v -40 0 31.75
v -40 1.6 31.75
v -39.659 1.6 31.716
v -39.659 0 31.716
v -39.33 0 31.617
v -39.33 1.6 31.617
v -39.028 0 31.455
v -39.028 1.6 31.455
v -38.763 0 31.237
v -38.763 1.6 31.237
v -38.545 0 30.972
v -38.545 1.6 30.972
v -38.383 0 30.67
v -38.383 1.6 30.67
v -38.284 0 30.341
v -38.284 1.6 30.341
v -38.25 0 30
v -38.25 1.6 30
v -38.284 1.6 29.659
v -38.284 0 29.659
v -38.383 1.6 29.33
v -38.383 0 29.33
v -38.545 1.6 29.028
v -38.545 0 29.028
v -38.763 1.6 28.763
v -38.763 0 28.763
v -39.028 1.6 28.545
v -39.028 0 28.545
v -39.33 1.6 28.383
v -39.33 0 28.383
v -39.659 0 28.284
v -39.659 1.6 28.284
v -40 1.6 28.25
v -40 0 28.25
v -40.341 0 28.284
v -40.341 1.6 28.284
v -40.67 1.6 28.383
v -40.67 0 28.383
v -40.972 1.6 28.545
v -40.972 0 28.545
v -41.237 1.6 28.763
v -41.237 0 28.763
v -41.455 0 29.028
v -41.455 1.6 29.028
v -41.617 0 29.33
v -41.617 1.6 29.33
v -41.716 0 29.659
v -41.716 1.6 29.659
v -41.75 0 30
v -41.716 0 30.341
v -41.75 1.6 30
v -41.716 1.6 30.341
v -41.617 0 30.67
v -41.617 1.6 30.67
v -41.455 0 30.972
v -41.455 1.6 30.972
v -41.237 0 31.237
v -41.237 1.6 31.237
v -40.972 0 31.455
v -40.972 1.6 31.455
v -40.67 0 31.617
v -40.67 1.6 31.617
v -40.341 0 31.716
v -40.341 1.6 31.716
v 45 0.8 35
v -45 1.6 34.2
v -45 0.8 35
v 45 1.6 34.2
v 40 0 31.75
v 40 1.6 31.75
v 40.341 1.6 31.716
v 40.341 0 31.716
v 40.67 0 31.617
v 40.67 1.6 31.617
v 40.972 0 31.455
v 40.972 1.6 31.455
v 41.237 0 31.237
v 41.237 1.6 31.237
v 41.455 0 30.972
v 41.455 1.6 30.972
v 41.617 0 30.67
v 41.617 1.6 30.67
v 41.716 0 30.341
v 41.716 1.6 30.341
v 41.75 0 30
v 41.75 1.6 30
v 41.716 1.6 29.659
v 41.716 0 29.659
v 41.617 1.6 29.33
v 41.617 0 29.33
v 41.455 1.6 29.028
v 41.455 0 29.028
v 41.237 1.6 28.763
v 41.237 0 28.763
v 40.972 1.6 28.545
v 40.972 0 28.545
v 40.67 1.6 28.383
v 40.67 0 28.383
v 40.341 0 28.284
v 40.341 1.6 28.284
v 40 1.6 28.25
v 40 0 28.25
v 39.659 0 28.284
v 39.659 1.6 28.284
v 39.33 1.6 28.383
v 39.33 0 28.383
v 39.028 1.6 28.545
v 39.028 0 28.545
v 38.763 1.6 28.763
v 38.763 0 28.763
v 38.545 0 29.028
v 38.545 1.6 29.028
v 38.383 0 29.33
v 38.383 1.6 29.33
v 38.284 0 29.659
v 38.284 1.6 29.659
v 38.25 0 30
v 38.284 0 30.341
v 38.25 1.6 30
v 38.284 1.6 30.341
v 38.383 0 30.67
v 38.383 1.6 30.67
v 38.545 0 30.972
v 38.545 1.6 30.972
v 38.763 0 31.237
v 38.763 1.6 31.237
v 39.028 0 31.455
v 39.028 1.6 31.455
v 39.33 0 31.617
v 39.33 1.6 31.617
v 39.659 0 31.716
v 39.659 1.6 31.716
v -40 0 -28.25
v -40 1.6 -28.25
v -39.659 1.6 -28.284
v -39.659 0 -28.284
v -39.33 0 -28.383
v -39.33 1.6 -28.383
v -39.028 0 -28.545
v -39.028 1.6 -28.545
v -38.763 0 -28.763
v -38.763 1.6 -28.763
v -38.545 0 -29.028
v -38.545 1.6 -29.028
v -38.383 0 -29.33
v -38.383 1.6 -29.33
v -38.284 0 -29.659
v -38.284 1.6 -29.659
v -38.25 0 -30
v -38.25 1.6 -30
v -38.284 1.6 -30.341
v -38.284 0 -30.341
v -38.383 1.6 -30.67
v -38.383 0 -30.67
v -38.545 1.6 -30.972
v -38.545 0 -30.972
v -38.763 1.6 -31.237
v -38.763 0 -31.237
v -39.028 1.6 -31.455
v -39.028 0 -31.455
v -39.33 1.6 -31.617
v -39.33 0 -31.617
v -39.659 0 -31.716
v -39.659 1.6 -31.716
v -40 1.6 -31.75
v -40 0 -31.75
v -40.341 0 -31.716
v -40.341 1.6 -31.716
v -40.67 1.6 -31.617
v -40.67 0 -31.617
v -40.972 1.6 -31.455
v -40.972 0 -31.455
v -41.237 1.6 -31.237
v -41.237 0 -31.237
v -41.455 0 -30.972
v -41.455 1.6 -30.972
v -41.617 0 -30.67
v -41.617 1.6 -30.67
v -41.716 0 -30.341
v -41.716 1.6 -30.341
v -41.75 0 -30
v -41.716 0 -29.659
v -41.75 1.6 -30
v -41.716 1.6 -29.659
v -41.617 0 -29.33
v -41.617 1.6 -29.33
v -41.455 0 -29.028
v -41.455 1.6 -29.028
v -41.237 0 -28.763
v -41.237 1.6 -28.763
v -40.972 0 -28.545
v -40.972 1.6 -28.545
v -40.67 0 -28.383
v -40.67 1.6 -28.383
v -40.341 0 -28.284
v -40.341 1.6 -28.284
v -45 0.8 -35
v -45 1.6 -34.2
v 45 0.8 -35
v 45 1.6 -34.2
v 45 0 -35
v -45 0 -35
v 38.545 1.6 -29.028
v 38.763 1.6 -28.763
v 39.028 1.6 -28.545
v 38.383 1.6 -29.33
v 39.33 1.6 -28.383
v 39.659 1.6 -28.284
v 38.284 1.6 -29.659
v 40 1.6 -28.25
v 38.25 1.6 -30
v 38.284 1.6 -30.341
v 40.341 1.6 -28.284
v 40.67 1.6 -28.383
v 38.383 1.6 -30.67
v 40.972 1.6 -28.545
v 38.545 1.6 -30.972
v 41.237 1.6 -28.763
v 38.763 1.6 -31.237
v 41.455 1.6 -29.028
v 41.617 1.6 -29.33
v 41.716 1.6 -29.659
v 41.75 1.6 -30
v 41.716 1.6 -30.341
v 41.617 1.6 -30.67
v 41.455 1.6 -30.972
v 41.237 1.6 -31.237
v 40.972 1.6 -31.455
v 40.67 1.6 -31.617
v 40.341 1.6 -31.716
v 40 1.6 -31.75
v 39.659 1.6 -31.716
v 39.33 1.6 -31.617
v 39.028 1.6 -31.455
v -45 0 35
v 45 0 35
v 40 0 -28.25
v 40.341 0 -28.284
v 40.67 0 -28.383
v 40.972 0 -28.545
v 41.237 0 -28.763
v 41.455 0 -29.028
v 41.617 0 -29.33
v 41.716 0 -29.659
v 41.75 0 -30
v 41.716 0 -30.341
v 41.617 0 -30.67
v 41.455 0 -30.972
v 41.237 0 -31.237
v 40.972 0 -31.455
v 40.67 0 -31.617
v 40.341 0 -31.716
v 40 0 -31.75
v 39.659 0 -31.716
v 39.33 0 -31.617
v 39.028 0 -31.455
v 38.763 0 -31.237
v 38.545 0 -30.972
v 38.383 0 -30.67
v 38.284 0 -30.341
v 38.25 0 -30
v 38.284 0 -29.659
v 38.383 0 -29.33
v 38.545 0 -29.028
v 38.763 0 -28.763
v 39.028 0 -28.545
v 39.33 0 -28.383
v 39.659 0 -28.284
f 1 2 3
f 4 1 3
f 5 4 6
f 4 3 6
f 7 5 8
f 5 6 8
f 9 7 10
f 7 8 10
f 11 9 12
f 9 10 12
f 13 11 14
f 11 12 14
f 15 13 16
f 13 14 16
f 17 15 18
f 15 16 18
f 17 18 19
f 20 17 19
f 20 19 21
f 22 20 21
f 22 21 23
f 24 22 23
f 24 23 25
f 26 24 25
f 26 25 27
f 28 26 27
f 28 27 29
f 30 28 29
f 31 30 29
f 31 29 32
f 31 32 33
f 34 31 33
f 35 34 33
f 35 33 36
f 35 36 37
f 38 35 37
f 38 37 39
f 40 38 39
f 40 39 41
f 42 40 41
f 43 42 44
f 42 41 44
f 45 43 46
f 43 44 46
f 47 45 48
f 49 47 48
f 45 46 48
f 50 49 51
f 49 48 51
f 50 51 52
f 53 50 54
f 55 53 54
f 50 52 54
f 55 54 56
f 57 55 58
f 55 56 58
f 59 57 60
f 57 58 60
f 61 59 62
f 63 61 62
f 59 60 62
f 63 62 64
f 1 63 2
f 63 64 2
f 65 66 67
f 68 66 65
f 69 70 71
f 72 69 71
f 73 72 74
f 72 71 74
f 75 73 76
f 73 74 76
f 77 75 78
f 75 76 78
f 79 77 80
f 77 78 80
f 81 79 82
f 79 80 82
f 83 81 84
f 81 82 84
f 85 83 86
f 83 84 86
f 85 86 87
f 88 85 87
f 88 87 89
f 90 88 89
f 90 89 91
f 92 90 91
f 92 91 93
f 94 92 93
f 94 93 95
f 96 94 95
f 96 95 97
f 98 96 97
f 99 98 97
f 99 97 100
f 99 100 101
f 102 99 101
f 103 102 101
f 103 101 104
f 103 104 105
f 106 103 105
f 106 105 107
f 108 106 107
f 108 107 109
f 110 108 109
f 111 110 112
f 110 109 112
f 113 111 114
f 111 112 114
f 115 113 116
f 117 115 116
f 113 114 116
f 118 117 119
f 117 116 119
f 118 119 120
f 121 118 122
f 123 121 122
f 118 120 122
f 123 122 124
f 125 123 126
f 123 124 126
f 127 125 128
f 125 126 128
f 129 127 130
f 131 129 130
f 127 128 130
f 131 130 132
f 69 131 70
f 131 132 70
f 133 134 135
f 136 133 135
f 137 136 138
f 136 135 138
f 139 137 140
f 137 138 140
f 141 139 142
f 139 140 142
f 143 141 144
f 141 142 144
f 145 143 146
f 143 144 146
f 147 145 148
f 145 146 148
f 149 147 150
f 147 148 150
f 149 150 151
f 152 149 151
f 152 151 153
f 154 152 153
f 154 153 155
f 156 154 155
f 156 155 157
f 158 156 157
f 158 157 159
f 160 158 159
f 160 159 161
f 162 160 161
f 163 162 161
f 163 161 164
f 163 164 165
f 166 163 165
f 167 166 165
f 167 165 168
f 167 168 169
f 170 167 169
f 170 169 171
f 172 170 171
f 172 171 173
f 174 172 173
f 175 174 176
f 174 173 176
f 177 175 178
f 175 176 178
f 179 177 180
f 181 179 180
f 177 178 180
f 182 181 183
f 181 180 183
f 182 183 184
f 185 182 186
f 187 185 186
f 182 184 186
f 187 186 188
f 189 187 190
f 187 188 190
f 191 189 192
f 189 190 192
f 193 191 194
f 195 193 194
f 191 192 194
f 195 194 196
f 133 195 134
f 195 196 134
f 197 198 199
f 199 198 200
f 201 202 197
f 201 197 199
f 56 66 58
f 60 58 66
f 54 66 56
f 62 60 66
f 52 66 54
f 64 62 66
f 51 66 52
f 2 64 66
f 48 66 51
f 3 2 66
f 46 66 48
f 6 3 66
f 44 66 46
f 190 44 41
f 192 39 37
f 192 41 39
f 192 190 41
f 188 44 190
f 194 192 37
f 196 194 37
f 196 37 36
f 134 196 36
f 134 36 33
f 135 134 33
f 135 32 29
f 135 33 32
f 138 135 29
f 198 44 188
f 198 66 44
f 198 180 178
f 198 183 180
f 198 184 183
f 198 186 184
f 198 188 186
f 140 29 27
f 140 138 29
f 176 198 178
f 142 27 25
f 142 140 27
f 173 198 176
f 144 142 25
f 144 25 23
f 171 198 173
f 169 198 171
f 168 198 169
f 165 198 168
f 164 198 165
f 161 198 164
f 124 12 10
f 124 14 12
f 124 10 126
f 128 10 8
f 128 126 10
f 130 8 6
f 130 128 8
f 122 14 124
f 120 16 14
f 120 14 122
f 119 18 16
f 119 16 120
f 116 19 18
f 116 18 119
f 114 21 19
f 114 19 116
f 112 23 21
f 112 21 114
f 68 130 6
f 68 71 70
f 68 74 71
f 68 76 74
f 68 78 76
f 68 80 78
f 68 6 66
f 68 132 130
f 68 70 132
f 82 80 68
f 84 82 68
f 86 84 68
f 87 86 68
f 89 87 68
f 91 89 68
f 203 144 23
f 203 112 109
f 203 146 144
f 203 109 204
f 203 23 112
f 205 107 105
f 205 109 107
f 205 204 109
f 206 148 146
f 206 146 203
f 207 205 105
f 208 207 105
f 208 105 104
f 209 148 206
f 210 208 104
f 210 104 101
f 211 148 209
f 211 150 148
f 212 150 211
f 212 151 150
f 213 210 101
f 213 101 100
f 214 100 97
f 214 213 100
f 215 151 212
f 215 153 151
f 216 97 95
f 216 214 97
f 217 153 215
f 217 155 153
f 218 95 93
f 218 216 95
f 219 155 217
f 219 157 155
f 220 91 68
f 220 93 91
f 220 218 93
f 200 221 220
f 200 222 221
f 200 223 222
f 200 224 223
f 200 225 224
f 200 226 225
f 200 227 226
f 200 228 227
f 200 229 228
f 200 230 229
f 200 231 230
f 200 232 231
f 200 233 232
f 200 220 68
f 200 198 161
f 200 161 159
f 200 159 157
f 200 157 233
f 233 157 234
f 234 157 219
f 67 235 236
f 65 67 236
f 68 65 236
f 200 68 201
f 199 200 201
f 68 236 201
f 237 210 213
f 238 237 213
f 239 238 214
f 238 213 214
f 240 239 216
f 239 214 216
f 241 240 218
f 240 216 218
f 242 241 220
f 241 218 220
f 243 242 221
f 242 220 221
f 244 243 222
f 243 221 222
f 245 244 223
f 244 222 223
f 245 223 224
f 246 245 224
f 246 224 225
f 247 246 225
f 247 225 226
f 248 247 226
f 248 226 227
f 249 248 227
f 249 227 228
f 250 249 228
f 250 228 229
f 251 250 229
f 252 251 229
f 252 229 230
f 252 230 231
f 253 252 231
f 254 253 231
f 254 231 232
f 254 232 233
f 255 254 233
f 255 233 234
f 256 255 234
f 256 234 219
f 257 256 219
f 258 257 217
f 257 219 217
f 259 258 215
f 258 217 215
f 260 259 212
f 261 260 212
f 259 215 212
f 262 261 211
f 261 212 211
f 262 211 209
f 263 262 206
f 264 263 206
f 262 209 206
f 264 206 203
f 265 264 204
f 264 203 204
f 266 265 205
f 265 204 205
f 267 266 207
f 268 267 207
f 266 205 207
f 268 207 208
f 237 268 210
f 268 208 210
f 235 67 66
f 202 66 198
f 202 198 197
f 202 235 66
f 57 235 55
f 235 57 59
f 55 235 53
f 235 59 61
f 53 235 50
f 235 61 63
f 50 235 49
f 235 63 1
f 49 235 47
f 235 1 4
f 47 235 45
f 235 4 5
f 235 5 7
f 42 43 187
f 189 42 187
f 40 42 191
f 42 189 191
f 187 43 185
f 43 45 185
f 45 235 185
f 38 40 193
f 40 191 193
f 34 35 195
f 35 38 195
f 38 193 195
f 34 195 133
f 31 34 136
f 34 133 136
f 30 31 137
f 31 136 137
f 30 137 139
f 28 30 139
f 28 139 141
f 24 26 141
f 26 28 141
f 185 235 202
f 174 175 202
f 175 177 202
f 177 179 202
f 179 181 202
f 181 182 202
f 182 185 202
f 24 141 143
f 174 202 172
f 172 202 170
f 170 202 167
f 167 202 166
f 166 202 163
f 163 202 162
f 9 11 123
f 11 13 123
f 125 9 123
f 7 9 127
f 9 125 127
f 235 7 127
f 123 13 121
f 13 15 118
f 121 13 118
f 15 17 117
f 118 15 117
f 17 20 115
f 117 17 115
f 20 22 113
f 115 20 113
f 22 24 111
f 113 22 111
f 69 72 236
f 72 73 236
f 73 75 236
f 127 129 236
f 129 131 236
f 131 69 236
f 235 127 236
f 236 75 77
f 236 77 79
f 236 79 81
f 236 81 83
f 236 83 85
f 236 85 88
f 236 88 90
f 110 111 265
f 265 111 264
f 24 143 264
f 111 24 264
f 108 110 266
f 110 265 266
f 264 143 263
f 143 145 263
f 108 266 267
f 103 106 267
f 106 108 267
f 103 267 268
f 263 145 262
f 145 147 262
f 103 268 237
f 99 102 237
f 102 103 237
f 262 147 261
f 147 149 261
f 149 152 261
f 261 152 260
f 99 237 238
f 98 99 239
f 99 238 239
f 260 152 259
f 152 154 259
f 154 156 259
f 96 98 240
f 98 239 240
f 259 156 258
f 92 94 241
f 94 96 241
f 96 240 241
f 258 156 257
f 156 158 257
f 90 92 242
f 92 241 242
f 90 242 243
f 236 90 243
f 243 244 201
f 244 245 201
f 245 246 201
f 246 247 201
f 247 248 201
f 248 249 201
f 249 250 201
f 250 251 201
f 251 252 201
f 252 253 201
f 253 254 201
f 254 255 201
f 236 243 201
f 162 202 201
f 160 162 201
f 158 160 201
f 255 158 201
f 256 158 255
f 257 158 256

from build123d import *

# Parameters (mm, degrees)
SKETCH1_W           = 90
SKETCH1_H           = 70
BOSS_EXTRUDE1_DEPTH = 1.6
SKETCH2_R           = 1.75
CUT_EXTRUDE1_DEPTH  = 58.031219521
CHAMFER1_SIZE       = 0.8


with BuildPart() as part:
    # Sketch1 → Boss-Extrude1 (new body)
    with BuildSketch(Plane(origin=(0, 0, 0), x_dir=(1, 0, 0), z_dir=(0, 1, 0))):
        Rectangle(SKETCH1_W, SKETCH1_H)
    extrude(amount=BOSS_EXTRUDE1_DEPTH)

    # Sketch2 → Cut-Extrude1 (cut, through all)
    with BuildSketch(Plane(origin=(0, 1.6, 0), x_dir=(1, 0, 0), z_dir=(0, 1, 0))):
        with Locations(Location((-40, -30, 0), (0, 0, 270))):
            Circle(SKETCH2_R)
        with Locations(Location((-40, 30, 0), (0, 0, 270))):
            Circle(SKETCH2_R)
        with Locations(Location((40, 30, 0), (0, 0, 270))):
            Circle(SKETCH2_R)
        with Locations(Location((40, -30, 0), (0, 0, 270))):
            Circle(SKETCH2_R)
    extrude(amount=-CUT_EXTRUDE1_DEPTH, mode=Mode.SUBTRACT)

    # Chamfer1
    chamfer1_edges = [part.edges().sort_by_distance(p)[0] for p in [
        (0, 1.6, 35),
        (0, 1.6, -35),
    ]]
    chamfer(chamfer1_edges, length=CHAMFER1_SIZE)


solid = part.part
